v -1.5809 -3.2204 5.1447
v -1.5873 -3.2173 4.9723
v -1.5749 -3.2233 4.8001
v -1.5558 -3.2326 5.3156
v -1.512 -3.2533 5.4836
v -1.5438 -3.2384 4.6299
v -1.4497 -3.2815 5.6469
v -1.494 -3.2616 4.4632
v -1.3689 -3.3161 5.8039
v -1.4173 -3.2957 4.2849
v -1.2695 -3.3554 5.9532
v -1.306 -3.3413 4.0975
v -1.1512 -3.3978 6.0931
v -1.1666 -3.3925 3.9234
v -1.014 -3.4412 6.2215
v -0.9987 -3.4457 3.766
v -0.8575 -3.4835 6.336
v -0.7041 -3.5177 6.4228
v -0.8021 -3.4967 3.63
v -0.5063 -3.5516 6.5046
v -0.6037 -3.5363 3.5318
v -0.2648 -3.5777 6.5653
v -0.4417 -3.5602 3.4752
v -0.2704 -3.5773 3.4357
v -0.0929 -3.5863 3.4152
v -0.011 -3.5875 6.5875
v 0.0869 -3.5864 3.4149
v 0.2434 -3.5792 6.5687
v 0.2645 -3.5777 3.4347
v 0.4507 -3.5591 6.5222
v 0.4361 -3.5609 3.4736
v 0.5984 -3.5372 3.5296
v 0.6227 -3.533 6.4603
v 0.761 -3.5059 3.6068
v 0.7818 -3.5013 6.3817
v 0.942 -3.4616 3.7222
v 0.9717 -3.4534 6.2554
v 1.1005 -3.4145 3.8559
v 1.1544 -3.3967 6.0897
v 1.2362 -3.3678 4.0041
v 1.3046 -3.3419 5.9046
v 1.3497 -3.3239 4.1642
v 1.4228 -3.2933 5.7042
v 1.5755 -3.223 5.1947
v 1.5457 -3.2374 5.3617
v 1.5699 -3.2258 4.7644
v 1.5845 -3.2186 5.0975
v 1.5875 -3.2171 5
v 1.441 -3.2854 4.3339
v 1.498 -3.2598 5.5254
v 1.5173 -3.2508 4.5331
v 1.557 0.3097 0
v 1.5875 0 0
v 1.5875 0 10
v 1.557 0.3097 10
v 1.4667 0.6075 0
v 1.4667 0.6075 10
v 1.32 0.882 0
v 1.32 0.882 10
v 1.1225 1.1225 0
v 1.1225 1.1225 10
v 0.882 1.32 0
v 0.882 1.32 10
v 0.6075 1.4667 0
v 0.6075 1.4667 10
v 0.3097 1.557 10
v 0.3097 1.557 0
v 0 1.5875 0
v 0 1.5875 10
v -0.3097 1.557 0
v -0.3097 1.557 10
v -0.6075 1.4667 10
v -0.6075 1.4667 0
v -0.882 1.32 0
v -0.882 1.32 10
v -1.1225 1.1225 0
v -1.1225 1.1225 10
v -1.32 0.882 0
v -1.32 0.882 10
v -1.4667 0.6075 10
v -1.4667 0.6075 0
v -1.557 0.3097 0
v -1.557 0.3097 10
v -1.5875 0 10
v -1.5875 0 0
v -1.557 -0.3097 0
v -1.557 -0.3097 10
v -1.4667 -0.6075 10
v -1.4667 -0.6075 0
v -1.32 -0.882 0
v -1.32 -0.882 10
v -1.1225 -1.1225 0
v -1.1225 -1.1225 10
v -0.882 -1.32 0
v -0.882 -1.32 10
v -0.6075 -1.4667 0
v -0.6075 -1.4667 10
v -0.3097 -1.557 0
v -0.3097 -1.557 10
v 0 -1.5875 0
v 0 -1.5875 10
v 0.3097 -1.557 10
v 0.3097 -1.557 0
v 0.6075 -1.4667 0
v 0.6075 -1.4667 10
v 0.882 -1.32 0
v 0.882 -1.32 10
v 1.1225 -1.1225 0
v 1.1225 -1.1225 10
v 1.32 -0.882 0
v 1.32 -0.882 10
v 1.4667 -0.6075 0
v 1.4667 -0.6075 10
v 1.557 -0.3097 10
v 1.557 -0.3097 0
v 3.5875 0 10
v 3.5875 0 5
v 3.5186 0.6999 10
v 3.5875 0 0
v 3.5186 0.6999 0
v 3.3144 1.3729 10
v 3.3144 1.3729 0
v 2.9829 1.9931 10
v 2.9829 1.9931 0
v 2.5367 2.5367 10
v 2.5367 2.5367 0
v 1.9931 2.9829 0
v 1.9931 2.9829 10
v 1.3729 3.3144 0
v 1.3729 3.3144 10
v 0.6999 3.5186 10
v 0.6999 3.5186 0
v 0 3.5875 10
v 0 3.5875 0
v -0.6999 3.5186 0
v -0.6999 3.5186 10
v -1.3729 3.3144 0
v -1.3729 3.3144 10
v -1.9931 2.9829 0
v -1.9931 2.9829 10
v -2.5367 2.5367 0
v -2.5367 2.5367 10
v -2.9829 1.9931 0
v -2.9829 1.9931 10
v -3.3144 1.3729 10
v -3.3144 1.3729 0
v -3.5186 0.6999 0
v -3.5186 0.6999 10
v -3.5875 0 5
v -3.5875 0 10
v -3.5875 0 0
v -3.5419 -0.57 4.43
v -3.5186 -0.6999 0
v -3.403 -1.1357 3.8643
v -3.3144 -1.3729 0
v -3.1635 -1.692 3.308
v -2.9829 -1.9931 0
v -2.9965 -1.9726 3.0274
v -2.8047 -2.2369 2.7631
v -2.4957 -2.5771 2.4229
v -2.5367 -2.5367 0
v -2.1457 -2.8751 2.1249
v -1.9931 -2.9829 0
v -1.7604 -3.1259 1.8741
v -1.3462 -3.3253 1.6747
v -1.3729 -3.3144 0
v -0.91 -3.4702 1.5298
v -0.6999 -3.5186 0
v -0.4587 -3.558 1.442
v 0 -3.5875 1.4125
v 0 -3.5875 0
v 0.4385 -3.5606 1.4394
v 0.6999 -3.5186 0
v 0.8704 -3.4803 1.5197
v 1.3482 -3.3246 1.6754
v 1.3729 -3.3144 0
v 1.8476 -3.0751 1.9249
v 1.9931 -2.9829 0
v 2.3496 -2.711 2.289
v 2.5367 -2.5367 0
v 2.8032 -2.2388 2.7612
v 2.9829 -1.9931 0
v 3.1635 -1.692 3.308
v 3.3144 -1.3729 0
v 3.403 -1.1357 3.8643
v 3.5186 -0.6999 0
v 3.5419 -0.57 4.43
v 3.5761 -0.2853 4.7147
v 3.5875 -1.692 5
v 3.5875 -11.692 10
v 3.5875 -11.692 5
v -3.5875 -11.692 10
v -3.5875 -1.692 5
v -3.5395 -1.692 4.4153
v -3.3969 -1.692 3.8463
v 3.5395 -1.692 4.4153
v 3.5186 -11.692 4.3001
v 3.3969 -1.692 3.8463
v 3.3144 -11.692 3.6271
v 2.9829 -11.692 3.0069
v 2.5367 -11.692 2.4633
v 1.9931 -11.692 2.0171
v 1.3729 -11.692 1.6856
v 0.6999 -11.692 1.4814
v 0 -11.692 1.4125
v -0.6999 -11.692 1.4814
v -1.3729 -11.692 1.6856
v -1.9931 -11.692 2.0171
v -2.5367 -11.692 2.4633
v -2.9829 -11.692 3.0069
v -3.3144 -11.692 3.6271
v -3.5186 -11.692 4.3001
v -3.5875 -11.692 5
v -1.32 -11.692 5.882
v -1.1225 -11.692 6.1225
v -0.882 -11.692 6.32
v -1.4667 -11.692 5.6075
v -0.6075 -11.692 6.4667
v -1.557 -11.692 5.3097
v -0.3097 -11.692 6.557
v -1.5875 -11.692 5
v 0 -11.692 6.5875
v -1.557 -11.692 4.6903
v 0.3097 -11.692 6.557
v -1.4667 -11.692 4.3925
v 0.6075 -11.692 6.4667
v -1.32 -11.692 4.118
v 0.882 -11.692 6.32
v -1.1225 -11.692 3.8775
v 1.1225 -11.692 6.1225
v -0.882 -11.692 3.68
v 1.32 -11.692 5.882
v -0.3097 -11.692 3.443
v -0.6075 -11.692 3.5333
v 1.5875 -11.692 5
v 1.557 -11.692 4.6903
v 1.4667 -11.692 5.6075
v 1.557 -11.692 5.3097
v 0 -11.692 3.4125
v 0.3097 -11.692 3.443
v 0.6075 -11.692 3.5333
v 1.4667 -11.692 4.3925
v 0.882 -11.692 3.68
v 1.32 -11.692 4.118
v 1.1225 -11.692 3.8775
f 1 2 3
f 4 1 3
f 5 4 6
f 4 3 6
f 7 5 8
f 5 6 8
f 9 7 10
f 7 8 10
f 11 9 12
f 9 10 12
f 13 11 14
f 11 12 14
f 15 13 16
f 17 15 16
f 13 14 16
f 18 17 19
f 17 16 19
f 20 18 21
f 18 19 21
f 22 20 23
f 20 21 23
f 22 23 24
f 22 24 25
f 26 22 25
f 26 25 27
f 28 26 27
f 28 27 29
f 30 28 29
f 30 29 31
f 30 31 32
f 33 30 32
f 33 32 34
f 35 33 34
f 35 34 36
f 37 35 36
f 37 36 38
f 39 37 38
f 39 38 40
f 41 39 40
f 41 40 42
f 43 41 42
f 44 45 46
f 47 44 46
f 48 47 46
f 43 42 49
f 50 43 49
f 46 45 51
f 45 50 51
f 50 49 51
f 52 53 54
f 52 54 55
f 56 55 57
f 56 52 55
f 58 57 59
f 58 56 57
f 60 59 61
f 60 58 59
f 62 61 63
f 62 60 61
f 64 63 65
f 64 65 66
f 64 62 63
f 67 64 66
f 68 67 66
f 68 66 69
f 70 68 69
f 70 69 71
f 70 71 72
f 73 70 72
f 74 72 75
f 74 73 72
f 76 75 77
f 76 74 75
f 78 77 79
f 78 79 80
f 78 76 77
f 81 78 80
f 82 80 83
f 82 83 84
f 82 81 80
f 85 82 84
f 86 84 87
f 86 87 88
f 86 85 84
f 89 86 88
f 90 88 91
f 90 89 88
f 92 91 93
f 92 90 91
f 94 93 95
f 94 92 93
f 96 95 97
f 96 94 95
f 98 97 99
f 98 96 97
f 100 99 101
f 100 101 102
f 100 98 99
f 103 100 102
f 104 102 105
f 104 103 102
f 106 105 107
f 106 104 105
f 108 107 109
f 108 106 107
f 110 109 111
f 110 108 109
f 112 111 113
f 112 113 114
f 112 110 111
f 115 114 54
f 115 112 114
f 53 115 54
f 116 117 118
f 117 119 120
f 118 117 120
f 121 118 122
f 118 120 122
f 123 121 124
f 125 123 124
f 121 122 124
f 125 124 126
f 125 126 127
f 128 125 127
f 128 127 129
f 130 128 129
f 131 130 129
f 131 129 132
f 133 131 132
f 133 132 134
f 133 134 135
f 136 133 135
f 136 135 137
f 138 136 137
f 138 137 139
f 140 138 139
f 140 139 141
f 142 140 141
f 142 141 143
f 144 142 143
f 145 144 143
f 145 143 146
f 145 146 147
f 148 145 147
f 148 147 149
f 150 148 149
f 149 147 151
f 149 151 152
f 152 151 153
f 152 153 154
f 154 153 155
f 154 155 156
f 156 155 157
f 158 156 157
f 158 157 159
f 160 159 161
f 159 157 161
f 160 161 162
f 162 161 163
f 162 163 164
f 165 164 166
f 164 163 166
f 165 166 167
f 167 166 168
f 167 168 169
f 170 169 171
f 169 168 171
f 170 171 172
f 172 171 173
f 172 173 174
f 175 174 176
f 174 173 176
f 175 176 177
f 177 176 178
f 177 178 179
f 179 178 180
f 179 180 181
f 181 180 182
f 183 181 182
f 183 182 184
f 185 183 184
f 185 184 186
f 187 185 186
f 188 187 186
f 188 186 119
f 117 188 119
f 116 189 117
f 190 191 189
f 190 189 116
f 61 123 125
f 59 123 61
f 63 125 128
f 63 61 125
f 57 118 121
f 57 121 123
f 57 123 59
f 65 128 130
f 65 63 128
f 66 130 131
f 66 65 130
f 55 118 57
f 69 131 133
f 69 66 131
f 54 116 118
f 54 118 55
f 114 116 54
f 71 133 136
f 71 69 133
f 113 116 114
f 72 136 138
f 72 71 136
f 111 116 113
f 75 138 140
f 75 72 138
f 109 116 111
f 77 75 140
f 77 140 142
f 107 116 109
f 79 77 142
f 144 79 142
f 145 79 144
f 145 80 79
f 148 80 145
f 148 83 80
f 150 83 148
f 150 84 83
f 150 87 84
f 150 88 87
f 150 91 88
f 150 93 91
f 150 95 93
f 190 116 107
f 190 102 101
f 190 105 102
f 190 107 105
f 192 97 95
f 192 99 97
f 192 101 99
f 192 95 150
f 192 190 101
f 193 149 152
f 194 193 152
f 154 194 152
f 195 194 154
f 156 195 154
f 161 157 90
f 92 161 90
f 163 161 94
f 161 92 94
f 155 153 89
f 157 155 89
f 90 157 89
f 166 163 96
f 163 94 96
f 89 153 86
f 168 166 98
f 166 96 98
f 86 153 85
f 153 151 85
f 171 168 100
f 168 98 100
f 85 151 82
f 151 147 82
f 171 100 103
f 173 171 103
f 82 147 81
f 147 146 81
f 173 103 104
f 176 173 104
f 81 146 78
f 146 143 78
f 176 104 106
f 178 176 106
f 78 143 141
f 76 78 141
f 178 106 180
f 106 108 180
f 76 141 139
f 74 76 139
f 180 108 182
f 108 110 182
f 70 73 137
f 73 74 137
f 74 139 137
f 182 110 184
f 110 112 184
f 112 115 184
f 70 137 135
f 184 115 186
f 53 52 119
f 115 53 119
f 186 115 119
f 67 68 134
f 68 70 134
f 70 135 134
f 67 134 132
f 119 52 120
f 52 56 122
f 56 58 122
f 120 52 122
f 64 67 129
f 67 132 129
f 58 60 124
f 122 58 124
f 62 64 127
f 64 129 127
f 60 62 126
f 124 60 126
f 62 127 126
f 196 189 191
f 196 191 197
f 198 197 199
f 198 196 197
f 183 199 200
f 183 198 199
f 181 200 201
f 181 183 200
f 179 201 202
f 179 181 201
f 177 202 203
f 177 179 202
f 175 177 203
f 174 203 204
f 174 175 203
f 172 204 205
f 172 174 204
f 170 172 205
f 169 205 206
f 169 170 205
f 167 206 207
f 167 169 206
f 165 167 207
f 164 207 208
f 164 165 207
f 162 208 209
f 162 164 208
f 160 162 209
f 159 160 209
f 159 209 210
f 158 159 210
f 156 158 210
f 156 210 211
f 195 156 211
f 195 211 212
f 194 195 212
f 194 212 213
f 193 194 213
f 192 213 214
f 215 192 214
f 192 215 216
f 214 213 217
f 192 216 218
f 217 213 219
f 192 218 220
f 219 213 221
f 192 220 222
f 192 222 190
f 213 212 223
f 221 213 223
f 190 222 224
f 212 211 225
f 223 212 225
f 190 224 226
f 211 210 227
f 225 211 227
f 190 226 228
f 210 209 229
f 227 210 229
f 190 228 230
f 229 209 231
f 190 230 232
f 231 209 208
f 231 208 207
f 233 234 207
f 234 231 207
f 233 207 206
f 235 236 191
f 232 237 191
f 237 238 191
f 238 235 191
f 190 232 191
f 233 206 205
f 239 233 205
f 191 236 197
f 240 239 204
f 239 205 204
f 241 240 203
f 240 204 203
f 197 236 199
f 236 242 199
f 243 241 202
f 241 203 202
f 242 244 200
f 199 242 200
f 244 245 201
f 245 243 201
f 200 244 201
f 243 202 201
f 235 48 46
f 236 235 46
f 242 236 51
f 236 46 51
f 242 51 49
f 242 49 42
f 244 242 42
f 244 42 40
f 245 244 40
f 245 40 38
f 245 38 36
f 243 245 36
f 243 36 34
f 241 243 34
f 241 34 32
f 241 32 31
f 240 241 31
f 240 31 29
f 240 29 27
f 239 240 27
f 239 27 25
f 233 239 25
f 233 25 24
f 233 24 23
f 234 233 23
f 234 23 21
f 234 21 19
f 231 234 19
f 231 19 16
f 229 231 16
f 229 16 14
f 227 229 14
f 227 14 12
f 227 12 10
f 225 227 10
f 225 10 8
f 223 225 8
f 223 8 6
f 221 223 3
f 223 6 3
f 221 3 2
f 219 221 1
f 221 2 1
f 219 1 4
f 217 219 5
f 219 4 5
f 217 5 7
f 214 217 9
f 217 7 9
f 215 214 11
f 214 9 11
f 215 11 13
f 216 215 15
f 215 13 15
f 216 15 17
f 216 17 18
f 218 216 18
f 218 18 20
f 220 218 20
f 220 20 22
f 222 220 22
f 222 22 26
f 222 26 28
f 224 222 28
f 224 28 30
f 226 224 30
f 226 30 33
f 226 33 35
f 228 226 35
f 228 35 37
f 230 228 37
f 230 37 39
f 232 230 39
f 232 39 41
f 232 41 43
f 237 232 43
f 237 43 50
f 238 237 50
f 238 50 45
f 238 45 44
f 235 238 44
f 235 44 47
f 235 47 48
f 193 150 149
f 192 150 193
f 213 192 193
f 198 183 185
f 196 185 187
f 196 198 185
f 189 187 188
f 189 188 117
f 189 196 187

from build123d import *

# Parameters (mm, degrees)
SKETCH1_R           = 3.5875
SKETCH1_R_2         = 1.5875
BOSS_EXTRUDE1_DEPTH = 10
SKETCH2_R           = 1.5875
BOSS_EXTRUDE2_DEPTH = 10
BOSS_EXTRUDE3_REACH = 7.279


with BuildPart() as part:
    # Sketch1 → Boss-Extrude1 (new body)
    with BuildSketch(Plane.XY):
        Circle(SKETCH1_R)
        Circle(SKETCH1_R_2, mode=Mode.SUBTRACT)
    extrude(amount=BOSS_EXTRUDE1_DEPTH)

    # Sketch2 → Boss-Extrude2 (add)
    with BuildSketch(Plane(origin=(0, -1.69195383, 0), x_dir=(1, 0, 0), z_dir=(0, 1, 0))):
        with BuildLine():
            Line((-3.5875, -5), (-3.5875, -10))
            Line((-3.5875, -10), (3.5875, -10))
            Line((3.5875, -10), (3.5875, -5))
            ThreePointArc((3.5875, -5), (0, -1.4125), (-3.5875, -5))
        make_face()
        with Locations((0, -5)):
            Circle(SKETCH2_R, mode=Mode.SUBTRACT)
    extrude(amount=-BOSS_EXTRUDE2_DEPTH)

    # Sketch3 → Boss-Extrude3 (add, up to next)
    with BuildSketch(Plane(origin=(0, -1.69195383, 0), x_dir=(1, 0, 0), z_dir=(0, 1, 0)), mode=Mode.PRIVATE) as boss_extrude3_sk1:
        with BuildLine():
            Line((-3.5875, -10), (-3.5875, -5))
            ThreePointArc((-3.5875, -5), (-3.479874394, -4.127858699), (-3.16345515, -3.30804617))
            Line((-3.16345515, -3.30804617), (-3.16345515, -10))
            Line((-3.16345515, -10), (-3.5875, -10))
        make_face()
    boss_extrude3_tool1 = extrude(boss_extrude3_sk1.sketch, amount=BOSS_EXTRUDE3_REACH, mode=Mode.PRIVATE) - part.part
    add(boss_extrude3_tool1.solids().sort_by_distance((-3.367759, -1.691954, 6.916202))[0])
    # Sketch3 → Boss-Extrude3 (add, up to next)
    with BuildSketch(Plane(origin=(0, -1.69195383, 0), x_dir=(1, 0, 0), z_dir=(0, 1, 0)), mode=Mode.PRIVATE) as boss_extrude3_sk2:
        with BuildLine():
            Line((3.16345515, -10), (3.16345515, -3.30804617))
            ThreePointArc((3.16345515, -3.30804617), (3.479874394, -4.127858699), (3.5875, -5))
            Line((3.5875, -5), (3.5875, -10))
            Line((3.5875, -10), (3.16345515, -10))
        make_face()
    boss_extrude3_tool2 = extrude(boss_extrude3_sk2.sketch, amount=BOSS_EXTRUDE3_REACH, mode=Mode.PRIVATE) - part.part
    add(boss_extrude3_tool2.solids().sort_by_distance((3.367759, -1.691954, 6.916202))[0])


solid = part.part
